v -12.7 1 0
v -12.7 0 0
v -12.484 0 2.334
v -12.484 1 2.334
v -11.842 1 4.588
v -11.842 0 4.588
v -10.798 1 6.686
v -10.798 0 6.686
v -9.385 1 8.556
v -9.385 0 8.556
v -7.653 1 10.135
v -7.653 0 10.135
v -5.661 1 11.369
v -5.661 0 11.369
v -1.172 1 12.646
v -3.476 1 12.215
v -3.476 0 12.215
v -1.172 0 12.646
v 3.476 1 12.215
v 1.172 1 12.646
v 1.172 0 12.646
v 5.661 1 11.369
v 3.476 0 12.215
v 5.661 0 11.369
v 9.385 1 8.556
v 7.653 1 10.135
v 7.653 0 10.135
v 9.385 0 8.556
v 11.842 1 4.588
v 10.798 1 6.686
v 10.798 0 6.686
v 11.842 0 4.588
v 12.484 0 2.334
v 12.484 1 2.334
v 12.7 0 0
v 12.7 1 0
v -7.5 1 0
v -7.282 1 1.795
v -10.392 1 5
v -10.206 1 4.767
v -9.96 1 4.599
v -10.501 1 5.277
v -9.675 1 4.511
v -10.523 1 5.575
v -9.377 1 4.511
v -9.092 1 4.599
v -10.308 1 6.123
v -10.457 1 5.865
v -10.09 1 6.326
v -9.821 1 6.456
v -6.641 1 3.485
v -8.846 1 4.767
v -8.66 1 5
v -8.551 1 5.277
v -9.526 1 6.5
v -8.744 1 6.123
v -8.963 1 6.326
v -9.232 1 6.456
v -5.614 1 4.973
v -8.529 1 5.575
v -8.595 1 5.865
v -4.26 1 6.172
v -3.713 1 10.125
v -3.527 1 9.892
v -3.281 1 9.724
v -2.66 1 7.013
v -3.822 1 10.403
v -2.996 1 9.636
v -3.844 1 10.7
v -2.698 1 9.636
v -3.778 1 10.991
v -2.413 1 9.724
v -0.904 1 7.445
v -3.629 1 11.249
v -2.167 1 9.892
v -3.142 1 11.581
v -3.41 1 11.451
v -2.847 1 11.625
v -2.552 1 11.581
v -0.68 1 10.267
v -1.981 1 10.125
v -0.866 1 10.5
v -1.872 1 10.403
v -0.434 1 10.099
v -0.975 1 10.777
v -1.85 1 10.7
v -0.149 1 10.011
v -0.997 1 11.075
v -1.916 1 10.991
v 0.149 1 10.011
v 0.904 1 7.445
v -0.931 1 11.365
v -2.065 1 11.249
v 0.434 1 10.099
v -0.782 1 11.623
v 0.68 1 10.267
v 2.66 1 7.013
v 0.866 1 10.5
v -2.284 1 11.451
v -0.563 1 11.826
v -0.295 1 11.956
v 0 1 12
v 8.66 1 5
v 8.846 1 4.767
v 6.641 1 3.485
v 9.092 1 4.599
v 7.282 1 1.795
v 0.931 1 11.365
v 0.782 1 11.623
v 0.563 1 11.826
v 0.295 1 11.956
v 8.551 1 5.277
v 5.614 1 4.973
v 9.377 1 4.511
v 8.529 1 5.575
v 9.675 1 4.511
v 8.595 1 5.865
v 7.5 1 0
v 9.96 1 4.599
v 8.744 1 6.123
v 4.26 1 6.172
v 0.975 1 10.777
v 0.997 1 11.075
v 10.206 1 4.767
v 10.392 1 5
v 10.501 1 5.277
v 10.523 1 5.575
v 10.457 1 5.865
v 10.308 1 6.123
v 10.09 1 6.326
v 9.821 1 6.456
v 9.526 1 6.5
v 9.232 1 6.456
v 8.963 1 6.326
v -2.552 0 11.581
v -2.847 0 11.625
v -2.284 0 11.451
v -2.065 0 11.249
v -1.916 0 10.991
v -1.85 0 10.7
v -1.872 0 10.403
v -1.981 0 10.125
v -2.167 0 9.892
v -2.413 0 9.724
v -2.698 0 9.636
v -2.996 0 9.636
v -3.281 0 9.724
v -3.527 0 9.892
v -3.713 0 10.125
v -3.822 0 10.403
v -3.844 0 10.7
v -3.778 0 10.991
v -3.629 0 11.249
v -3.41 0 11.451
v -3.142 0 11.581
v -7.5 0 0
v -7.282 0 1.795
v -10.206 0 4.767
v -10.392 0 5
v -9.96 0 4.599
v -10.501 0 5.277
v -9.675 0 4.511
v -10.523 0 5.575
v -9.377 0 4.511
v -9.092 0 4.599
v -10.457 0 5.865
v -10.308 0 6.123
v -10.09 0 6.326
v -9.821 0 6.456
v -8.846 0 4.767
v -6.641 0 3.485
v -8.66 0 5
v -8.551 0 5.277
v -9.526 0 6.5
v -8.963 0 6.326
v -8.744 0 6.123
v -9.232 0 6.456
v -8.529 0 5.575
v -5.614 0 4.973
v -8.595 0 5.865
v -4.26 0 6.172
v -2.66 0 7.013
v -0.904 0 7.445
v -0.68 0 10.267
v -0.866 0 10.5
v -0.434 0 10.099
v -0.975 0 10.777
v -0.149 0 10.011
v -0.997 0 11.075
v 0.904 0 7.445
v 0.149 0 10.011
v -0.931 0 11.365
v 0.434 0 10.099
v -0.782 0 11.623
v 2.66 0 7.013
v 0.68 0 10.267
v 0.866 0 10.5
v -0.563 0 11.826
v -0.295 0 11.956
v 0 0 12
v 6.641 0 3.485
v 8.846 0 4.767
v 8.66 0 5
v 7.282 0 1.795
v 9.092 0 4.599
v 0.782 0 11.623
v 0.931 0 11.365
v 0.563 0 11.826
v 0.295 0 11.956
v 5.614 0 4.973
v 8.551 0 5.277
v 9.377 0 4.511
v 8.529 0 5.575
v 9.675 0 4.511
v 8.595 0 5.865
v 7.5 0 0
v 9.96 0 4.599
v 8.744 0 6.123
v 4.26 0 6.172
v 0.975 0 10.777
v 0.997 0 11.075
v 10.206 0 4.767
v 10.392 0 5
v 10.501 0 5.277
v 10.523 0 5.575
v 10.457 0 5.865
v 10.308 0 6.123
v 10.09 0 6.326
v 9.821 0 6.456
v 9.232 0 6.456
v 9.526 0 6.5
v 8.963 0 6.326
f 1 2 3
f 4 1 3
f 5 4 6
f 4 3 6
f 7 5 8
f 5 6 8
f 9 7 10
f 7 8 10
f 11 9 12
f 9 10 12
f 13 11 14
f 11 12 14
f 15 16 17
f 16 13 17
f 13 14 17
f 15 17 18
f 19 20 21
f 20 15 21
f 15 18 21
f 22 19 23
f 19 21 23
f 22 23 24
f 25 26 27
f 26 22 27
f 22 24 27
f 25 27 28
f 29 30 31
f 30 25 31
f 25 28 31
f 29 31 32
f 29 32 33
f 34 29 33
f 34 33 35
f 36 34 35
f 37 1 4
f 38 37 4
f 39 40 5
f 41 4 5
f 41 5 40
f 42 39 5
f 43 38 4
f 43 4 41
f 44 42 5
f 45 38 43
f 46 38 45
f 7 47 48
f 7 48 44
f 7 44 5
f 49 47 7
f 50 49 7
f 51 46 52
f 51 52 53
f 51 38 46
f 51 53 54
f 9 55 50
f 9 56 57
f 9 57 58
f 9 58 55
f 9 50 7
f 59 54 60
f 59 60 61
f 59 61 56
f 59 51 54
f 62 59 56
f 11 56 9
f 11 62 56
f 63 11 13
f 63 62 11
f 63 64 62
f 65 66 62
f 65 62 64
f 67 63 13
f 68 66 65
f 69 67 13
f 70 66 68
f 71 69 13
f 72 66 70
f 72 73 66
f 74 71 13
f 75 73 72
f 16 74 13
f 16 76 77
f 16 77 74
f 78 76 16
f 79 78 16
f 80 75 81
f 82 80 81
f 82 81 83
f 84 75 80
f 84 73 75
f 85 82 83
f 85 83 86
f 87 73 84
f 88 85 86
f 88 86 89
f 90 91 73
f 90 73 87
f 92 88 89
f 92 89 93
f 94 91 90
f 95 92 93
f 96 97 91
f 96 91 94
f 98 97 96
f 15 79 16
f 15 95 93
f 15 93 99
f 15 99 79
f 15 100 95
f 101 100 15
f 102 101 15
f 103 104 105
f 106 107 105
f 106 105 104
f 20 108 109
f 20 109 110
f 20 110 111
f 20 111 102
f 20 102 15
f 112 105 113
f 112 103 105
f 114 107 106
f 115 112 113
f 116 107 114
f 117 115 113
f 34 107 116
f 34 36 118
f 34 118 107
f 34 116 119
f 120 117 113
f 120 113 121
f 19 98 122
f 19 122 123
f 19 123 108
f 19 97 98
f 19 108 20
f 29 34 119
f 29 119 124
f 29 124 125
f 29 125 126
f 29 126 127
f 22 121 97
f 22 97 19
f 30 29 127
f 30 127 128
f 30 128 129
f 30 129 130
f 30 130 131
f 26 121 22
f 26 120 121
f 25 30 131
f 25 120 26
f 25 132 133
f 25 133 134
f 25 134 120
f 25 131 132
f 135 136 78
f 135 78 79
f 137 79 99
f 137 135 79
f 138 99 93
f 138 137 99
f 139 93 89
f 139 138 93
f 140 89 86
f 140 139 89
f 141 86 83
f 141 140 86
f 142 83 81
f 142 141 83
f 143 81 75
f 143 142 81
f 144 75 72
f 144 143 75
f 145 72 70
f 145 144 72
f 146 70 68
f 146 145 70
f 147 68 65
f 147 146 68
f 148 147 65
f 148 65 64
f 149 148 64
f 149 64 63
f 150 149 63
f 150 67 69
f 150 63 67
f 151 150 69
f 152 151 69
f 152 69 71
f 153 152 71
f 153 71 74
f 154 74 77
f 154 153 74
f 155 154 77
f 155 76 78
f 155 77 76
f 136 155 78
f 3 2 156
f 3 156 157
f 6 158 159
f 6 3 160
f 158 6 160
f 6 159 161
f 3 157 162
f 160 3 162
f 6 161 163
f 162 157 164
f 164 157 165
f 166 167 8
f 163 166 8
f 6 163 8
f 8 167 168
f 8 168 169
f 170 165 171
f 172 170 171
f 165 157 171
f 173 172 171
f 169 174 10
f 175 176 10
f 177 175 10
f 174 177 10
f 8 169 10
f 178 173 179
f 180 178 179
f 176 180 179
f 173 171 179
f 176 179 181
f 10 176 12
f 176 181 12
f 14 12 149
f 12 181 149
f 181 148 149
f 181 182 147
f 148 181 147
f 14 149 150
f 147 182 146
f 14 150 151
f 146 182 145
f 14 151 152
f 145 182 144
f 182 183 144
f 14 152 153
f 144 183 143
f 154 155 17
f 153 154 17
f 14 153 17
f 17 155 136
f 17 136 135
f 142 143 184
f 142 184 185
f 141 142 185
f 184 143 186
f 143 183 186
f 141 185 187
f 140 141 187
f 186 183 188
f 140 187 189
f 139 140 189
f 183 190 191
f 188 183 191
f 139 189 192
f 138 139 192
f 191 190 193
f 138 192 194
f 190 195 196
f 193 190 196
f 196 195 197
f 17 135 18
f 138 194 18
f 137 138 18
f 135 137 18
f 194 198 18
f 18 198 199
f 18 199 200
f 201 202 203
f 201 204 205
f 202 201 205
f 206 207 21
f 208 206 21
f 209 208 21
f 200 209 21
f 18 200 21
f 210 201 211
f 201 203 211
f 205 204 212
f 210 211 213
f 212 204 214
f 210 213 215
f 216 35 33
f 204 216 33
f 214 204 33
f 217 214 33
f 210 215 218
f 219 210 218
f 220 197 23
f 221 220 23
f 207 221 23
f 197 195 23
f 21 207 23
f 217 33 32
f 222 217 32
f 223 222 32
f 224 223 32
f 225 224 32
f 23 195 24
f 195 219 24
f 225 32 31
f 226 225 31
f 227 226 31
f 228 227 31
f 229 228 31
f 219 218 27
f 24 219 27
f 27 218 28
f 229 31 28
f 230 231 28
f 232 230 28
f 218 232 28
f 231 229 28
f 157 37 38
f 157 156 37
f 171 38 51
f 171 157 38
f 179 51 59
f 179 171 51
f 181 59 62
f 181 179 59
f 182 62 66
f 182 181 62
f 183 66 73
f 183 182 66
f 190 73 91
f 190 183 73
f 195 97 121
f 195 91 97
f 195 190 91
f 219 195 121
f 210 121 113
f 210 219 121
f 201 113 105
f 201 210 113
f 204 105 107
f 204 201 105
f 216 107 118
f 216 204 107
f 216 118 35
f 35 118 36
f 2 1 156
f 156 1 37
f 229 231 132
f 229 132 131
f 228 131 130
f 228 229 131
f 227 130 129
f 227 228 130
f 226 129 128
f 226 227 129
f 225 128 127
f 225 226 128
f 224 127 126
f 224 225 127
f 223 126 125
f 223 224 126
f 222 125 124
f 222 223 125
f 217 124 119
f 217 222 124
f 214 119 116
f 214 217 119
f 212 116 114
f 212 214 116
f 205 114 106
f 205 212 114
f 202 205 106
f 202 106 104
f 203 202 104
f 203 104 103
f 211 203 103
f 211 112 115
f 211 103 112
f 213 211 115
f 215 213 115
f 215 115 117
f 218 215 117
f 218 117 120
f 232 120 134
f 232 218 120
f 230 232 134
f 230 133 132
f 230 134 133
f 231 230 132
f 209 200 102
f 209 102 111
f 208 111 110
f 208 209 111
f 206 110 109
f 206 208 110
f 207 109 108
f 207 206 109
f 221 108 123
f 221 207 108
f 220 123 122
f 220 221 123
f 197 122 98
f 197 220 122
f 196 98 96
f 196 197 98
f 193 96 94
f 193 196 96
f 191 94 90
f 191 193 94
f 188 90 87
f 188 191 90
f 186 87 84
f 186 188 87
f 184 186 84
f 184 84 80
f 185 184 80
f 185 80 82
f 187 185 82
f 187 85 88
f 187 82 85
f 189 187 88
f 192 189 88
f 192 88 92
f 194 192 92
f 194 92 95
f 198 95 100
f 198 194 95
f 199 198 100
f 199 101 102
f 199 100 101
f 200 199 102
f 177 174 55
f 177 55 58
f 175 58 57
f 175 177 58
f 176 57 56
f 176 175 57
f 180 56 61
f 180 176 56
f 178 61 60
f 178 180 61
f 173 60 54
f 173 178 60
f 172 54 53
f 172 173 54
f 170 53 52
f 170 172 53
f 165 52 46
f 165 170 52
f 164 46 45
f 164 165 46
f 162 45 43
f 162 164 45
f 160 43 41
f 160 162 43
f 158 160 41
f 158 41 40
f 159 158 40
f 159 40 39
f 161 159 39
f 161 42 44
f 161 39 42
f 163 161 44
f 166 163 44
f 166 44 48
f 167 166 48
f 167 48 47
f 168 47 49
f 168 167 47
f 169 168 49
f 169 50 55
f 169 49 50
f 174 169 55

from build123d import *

# Parameters (mm, degrees)
SKETCH1_R               = 12.7
BOSS_EXTRUDE1_DEPTH     = 1
CUT_EXTRUDE1_DEPTH      = 18.98832955
CUT_EXTRUDE1_DEPTH_BACK = 18.98832955
SKETCH19_R              = 1
CUT_EXTRUDE2_DEPTH      = 18.98832955
CUT_EXTRUDE2_DEPTH_BACK = 18.98832955
SKETCH20_R              = 7.5
SKETCH21_W              = 65.874202484
SKETCH21_H              = 51.979273979
CUT_EXTRUDE3_DEPTH      = 18.98832955
CUT_EXTRUDE4_DEPTH      = 18.98832955
CUT_EXTRUDE4_DEPTH_BACK = 18.98832955
SKETCH22_R              = 1


with BuildPart() as part:
    # Sketch1 → Boss-Extrude1 (new body)
    with BuildSketch(Plane(origin=(0, 0, 0), x_dir=(1, 0, 0), z_dir=(0, 1, 0))):
        with Locations(Location((0, 0, 0), (0, 0, 270))):
            Circle(SKETCH1_R)
    extrude(amount=BOSS_EXTRUDE1_DEPTH)

    # Sketch19 → Cut-Extrude1 (cut, two sides: drawn at the far end of the back side and taken through both)
    with BuildSketch(Plane(origin=(0, 1, 0), x_dir=(1, 0, 0), z_dir=(0, 1, 0)).offset(-CUT_EXTRUDE1_DEPTH_BACK)):
        with Locations(Location((0, 11, 0), (0, 0, 270))):
            Circle(SKETCH19_R)
        with Locations(Location((9.526279442, 5.5, 0), (0, 0, 270))):
            Circle(SKETCH19_R)
        with Locations(Location((9.526279442, -5.5, 0), (0, 0, 270))):
            Circle(SKETCH19_R)
        with Locations(Location((0, -11, 0), (0, 0, 270))):
            Circle(SKETCH19_R)
        with Locations(Location((-9.526279442, -5.5, 0), (0, 0, 270))):
            Circle(SKETCH19_R)
        with Locations(Location((-9.526279442, 5.5, 0), (0, 0, 270))):
            Circle(SKETCH19_R)
    extrude(amount=CUT_EXTRUDE1_DEPTH + CUT_EXTRUDE1_DEPTH_BACK, mode=Mode.SUBTRACT)

    # Sketch20 → Cut-Extrude2 (cut, two sides: drawn at the far end of the back side and taken through both)
    with BuildSketch(Plane(origin=(0, 1, 0), x_dir=(1, 0, 0), z_dir=(0, 1, 0)).offset(-CUT_EXTRUDE2_DEPTH_BACK)):
        with Locations(Location((0, 0, 0), (0, 0, 270))):
            Circle(SKETCH20_R)
    extrude(amount=CUT_EXTRUDE2_DEPTH + CUT_EXTRUDE2_DEPTH_BACK, mode=Mode.SUBTRACT)

    # Sketch21 → Cut-Extrude3 (cut, through all)
    with BuildSketch(Plane.XY):
        with Locations((-3.816154381, 6.321647006)):
            Rectangle(SKETCH21_W, SKETCH21_H)
    extrude(amount=-CUT_EXTRUDE3_DEPTH, mode=Mode.SUBTRACT)

    # Sketch22 → Cut-Extrude4 (cut, two sides: drawn at the far end of the back side and taken through both)
    with BuildSketch(Plane(origin=(0, 1, 0), x_dir=(1, 0, 0), z_dir=(0, 1, 0)).offset(-CUT_EXTRUDE4_DEPTH_BACK)):
        with Locations(Location((-2.847009496, -10.625184089, 0), (0, 0, 270))):
            Circle(SKETCH22_R)
    extrude(amount=CUT_EXTRUDE4_DEPTH + CUT_EXTRUDE4_DEPTH_BACK, mode=Mode.SUBTRACT)


solid = part.part
